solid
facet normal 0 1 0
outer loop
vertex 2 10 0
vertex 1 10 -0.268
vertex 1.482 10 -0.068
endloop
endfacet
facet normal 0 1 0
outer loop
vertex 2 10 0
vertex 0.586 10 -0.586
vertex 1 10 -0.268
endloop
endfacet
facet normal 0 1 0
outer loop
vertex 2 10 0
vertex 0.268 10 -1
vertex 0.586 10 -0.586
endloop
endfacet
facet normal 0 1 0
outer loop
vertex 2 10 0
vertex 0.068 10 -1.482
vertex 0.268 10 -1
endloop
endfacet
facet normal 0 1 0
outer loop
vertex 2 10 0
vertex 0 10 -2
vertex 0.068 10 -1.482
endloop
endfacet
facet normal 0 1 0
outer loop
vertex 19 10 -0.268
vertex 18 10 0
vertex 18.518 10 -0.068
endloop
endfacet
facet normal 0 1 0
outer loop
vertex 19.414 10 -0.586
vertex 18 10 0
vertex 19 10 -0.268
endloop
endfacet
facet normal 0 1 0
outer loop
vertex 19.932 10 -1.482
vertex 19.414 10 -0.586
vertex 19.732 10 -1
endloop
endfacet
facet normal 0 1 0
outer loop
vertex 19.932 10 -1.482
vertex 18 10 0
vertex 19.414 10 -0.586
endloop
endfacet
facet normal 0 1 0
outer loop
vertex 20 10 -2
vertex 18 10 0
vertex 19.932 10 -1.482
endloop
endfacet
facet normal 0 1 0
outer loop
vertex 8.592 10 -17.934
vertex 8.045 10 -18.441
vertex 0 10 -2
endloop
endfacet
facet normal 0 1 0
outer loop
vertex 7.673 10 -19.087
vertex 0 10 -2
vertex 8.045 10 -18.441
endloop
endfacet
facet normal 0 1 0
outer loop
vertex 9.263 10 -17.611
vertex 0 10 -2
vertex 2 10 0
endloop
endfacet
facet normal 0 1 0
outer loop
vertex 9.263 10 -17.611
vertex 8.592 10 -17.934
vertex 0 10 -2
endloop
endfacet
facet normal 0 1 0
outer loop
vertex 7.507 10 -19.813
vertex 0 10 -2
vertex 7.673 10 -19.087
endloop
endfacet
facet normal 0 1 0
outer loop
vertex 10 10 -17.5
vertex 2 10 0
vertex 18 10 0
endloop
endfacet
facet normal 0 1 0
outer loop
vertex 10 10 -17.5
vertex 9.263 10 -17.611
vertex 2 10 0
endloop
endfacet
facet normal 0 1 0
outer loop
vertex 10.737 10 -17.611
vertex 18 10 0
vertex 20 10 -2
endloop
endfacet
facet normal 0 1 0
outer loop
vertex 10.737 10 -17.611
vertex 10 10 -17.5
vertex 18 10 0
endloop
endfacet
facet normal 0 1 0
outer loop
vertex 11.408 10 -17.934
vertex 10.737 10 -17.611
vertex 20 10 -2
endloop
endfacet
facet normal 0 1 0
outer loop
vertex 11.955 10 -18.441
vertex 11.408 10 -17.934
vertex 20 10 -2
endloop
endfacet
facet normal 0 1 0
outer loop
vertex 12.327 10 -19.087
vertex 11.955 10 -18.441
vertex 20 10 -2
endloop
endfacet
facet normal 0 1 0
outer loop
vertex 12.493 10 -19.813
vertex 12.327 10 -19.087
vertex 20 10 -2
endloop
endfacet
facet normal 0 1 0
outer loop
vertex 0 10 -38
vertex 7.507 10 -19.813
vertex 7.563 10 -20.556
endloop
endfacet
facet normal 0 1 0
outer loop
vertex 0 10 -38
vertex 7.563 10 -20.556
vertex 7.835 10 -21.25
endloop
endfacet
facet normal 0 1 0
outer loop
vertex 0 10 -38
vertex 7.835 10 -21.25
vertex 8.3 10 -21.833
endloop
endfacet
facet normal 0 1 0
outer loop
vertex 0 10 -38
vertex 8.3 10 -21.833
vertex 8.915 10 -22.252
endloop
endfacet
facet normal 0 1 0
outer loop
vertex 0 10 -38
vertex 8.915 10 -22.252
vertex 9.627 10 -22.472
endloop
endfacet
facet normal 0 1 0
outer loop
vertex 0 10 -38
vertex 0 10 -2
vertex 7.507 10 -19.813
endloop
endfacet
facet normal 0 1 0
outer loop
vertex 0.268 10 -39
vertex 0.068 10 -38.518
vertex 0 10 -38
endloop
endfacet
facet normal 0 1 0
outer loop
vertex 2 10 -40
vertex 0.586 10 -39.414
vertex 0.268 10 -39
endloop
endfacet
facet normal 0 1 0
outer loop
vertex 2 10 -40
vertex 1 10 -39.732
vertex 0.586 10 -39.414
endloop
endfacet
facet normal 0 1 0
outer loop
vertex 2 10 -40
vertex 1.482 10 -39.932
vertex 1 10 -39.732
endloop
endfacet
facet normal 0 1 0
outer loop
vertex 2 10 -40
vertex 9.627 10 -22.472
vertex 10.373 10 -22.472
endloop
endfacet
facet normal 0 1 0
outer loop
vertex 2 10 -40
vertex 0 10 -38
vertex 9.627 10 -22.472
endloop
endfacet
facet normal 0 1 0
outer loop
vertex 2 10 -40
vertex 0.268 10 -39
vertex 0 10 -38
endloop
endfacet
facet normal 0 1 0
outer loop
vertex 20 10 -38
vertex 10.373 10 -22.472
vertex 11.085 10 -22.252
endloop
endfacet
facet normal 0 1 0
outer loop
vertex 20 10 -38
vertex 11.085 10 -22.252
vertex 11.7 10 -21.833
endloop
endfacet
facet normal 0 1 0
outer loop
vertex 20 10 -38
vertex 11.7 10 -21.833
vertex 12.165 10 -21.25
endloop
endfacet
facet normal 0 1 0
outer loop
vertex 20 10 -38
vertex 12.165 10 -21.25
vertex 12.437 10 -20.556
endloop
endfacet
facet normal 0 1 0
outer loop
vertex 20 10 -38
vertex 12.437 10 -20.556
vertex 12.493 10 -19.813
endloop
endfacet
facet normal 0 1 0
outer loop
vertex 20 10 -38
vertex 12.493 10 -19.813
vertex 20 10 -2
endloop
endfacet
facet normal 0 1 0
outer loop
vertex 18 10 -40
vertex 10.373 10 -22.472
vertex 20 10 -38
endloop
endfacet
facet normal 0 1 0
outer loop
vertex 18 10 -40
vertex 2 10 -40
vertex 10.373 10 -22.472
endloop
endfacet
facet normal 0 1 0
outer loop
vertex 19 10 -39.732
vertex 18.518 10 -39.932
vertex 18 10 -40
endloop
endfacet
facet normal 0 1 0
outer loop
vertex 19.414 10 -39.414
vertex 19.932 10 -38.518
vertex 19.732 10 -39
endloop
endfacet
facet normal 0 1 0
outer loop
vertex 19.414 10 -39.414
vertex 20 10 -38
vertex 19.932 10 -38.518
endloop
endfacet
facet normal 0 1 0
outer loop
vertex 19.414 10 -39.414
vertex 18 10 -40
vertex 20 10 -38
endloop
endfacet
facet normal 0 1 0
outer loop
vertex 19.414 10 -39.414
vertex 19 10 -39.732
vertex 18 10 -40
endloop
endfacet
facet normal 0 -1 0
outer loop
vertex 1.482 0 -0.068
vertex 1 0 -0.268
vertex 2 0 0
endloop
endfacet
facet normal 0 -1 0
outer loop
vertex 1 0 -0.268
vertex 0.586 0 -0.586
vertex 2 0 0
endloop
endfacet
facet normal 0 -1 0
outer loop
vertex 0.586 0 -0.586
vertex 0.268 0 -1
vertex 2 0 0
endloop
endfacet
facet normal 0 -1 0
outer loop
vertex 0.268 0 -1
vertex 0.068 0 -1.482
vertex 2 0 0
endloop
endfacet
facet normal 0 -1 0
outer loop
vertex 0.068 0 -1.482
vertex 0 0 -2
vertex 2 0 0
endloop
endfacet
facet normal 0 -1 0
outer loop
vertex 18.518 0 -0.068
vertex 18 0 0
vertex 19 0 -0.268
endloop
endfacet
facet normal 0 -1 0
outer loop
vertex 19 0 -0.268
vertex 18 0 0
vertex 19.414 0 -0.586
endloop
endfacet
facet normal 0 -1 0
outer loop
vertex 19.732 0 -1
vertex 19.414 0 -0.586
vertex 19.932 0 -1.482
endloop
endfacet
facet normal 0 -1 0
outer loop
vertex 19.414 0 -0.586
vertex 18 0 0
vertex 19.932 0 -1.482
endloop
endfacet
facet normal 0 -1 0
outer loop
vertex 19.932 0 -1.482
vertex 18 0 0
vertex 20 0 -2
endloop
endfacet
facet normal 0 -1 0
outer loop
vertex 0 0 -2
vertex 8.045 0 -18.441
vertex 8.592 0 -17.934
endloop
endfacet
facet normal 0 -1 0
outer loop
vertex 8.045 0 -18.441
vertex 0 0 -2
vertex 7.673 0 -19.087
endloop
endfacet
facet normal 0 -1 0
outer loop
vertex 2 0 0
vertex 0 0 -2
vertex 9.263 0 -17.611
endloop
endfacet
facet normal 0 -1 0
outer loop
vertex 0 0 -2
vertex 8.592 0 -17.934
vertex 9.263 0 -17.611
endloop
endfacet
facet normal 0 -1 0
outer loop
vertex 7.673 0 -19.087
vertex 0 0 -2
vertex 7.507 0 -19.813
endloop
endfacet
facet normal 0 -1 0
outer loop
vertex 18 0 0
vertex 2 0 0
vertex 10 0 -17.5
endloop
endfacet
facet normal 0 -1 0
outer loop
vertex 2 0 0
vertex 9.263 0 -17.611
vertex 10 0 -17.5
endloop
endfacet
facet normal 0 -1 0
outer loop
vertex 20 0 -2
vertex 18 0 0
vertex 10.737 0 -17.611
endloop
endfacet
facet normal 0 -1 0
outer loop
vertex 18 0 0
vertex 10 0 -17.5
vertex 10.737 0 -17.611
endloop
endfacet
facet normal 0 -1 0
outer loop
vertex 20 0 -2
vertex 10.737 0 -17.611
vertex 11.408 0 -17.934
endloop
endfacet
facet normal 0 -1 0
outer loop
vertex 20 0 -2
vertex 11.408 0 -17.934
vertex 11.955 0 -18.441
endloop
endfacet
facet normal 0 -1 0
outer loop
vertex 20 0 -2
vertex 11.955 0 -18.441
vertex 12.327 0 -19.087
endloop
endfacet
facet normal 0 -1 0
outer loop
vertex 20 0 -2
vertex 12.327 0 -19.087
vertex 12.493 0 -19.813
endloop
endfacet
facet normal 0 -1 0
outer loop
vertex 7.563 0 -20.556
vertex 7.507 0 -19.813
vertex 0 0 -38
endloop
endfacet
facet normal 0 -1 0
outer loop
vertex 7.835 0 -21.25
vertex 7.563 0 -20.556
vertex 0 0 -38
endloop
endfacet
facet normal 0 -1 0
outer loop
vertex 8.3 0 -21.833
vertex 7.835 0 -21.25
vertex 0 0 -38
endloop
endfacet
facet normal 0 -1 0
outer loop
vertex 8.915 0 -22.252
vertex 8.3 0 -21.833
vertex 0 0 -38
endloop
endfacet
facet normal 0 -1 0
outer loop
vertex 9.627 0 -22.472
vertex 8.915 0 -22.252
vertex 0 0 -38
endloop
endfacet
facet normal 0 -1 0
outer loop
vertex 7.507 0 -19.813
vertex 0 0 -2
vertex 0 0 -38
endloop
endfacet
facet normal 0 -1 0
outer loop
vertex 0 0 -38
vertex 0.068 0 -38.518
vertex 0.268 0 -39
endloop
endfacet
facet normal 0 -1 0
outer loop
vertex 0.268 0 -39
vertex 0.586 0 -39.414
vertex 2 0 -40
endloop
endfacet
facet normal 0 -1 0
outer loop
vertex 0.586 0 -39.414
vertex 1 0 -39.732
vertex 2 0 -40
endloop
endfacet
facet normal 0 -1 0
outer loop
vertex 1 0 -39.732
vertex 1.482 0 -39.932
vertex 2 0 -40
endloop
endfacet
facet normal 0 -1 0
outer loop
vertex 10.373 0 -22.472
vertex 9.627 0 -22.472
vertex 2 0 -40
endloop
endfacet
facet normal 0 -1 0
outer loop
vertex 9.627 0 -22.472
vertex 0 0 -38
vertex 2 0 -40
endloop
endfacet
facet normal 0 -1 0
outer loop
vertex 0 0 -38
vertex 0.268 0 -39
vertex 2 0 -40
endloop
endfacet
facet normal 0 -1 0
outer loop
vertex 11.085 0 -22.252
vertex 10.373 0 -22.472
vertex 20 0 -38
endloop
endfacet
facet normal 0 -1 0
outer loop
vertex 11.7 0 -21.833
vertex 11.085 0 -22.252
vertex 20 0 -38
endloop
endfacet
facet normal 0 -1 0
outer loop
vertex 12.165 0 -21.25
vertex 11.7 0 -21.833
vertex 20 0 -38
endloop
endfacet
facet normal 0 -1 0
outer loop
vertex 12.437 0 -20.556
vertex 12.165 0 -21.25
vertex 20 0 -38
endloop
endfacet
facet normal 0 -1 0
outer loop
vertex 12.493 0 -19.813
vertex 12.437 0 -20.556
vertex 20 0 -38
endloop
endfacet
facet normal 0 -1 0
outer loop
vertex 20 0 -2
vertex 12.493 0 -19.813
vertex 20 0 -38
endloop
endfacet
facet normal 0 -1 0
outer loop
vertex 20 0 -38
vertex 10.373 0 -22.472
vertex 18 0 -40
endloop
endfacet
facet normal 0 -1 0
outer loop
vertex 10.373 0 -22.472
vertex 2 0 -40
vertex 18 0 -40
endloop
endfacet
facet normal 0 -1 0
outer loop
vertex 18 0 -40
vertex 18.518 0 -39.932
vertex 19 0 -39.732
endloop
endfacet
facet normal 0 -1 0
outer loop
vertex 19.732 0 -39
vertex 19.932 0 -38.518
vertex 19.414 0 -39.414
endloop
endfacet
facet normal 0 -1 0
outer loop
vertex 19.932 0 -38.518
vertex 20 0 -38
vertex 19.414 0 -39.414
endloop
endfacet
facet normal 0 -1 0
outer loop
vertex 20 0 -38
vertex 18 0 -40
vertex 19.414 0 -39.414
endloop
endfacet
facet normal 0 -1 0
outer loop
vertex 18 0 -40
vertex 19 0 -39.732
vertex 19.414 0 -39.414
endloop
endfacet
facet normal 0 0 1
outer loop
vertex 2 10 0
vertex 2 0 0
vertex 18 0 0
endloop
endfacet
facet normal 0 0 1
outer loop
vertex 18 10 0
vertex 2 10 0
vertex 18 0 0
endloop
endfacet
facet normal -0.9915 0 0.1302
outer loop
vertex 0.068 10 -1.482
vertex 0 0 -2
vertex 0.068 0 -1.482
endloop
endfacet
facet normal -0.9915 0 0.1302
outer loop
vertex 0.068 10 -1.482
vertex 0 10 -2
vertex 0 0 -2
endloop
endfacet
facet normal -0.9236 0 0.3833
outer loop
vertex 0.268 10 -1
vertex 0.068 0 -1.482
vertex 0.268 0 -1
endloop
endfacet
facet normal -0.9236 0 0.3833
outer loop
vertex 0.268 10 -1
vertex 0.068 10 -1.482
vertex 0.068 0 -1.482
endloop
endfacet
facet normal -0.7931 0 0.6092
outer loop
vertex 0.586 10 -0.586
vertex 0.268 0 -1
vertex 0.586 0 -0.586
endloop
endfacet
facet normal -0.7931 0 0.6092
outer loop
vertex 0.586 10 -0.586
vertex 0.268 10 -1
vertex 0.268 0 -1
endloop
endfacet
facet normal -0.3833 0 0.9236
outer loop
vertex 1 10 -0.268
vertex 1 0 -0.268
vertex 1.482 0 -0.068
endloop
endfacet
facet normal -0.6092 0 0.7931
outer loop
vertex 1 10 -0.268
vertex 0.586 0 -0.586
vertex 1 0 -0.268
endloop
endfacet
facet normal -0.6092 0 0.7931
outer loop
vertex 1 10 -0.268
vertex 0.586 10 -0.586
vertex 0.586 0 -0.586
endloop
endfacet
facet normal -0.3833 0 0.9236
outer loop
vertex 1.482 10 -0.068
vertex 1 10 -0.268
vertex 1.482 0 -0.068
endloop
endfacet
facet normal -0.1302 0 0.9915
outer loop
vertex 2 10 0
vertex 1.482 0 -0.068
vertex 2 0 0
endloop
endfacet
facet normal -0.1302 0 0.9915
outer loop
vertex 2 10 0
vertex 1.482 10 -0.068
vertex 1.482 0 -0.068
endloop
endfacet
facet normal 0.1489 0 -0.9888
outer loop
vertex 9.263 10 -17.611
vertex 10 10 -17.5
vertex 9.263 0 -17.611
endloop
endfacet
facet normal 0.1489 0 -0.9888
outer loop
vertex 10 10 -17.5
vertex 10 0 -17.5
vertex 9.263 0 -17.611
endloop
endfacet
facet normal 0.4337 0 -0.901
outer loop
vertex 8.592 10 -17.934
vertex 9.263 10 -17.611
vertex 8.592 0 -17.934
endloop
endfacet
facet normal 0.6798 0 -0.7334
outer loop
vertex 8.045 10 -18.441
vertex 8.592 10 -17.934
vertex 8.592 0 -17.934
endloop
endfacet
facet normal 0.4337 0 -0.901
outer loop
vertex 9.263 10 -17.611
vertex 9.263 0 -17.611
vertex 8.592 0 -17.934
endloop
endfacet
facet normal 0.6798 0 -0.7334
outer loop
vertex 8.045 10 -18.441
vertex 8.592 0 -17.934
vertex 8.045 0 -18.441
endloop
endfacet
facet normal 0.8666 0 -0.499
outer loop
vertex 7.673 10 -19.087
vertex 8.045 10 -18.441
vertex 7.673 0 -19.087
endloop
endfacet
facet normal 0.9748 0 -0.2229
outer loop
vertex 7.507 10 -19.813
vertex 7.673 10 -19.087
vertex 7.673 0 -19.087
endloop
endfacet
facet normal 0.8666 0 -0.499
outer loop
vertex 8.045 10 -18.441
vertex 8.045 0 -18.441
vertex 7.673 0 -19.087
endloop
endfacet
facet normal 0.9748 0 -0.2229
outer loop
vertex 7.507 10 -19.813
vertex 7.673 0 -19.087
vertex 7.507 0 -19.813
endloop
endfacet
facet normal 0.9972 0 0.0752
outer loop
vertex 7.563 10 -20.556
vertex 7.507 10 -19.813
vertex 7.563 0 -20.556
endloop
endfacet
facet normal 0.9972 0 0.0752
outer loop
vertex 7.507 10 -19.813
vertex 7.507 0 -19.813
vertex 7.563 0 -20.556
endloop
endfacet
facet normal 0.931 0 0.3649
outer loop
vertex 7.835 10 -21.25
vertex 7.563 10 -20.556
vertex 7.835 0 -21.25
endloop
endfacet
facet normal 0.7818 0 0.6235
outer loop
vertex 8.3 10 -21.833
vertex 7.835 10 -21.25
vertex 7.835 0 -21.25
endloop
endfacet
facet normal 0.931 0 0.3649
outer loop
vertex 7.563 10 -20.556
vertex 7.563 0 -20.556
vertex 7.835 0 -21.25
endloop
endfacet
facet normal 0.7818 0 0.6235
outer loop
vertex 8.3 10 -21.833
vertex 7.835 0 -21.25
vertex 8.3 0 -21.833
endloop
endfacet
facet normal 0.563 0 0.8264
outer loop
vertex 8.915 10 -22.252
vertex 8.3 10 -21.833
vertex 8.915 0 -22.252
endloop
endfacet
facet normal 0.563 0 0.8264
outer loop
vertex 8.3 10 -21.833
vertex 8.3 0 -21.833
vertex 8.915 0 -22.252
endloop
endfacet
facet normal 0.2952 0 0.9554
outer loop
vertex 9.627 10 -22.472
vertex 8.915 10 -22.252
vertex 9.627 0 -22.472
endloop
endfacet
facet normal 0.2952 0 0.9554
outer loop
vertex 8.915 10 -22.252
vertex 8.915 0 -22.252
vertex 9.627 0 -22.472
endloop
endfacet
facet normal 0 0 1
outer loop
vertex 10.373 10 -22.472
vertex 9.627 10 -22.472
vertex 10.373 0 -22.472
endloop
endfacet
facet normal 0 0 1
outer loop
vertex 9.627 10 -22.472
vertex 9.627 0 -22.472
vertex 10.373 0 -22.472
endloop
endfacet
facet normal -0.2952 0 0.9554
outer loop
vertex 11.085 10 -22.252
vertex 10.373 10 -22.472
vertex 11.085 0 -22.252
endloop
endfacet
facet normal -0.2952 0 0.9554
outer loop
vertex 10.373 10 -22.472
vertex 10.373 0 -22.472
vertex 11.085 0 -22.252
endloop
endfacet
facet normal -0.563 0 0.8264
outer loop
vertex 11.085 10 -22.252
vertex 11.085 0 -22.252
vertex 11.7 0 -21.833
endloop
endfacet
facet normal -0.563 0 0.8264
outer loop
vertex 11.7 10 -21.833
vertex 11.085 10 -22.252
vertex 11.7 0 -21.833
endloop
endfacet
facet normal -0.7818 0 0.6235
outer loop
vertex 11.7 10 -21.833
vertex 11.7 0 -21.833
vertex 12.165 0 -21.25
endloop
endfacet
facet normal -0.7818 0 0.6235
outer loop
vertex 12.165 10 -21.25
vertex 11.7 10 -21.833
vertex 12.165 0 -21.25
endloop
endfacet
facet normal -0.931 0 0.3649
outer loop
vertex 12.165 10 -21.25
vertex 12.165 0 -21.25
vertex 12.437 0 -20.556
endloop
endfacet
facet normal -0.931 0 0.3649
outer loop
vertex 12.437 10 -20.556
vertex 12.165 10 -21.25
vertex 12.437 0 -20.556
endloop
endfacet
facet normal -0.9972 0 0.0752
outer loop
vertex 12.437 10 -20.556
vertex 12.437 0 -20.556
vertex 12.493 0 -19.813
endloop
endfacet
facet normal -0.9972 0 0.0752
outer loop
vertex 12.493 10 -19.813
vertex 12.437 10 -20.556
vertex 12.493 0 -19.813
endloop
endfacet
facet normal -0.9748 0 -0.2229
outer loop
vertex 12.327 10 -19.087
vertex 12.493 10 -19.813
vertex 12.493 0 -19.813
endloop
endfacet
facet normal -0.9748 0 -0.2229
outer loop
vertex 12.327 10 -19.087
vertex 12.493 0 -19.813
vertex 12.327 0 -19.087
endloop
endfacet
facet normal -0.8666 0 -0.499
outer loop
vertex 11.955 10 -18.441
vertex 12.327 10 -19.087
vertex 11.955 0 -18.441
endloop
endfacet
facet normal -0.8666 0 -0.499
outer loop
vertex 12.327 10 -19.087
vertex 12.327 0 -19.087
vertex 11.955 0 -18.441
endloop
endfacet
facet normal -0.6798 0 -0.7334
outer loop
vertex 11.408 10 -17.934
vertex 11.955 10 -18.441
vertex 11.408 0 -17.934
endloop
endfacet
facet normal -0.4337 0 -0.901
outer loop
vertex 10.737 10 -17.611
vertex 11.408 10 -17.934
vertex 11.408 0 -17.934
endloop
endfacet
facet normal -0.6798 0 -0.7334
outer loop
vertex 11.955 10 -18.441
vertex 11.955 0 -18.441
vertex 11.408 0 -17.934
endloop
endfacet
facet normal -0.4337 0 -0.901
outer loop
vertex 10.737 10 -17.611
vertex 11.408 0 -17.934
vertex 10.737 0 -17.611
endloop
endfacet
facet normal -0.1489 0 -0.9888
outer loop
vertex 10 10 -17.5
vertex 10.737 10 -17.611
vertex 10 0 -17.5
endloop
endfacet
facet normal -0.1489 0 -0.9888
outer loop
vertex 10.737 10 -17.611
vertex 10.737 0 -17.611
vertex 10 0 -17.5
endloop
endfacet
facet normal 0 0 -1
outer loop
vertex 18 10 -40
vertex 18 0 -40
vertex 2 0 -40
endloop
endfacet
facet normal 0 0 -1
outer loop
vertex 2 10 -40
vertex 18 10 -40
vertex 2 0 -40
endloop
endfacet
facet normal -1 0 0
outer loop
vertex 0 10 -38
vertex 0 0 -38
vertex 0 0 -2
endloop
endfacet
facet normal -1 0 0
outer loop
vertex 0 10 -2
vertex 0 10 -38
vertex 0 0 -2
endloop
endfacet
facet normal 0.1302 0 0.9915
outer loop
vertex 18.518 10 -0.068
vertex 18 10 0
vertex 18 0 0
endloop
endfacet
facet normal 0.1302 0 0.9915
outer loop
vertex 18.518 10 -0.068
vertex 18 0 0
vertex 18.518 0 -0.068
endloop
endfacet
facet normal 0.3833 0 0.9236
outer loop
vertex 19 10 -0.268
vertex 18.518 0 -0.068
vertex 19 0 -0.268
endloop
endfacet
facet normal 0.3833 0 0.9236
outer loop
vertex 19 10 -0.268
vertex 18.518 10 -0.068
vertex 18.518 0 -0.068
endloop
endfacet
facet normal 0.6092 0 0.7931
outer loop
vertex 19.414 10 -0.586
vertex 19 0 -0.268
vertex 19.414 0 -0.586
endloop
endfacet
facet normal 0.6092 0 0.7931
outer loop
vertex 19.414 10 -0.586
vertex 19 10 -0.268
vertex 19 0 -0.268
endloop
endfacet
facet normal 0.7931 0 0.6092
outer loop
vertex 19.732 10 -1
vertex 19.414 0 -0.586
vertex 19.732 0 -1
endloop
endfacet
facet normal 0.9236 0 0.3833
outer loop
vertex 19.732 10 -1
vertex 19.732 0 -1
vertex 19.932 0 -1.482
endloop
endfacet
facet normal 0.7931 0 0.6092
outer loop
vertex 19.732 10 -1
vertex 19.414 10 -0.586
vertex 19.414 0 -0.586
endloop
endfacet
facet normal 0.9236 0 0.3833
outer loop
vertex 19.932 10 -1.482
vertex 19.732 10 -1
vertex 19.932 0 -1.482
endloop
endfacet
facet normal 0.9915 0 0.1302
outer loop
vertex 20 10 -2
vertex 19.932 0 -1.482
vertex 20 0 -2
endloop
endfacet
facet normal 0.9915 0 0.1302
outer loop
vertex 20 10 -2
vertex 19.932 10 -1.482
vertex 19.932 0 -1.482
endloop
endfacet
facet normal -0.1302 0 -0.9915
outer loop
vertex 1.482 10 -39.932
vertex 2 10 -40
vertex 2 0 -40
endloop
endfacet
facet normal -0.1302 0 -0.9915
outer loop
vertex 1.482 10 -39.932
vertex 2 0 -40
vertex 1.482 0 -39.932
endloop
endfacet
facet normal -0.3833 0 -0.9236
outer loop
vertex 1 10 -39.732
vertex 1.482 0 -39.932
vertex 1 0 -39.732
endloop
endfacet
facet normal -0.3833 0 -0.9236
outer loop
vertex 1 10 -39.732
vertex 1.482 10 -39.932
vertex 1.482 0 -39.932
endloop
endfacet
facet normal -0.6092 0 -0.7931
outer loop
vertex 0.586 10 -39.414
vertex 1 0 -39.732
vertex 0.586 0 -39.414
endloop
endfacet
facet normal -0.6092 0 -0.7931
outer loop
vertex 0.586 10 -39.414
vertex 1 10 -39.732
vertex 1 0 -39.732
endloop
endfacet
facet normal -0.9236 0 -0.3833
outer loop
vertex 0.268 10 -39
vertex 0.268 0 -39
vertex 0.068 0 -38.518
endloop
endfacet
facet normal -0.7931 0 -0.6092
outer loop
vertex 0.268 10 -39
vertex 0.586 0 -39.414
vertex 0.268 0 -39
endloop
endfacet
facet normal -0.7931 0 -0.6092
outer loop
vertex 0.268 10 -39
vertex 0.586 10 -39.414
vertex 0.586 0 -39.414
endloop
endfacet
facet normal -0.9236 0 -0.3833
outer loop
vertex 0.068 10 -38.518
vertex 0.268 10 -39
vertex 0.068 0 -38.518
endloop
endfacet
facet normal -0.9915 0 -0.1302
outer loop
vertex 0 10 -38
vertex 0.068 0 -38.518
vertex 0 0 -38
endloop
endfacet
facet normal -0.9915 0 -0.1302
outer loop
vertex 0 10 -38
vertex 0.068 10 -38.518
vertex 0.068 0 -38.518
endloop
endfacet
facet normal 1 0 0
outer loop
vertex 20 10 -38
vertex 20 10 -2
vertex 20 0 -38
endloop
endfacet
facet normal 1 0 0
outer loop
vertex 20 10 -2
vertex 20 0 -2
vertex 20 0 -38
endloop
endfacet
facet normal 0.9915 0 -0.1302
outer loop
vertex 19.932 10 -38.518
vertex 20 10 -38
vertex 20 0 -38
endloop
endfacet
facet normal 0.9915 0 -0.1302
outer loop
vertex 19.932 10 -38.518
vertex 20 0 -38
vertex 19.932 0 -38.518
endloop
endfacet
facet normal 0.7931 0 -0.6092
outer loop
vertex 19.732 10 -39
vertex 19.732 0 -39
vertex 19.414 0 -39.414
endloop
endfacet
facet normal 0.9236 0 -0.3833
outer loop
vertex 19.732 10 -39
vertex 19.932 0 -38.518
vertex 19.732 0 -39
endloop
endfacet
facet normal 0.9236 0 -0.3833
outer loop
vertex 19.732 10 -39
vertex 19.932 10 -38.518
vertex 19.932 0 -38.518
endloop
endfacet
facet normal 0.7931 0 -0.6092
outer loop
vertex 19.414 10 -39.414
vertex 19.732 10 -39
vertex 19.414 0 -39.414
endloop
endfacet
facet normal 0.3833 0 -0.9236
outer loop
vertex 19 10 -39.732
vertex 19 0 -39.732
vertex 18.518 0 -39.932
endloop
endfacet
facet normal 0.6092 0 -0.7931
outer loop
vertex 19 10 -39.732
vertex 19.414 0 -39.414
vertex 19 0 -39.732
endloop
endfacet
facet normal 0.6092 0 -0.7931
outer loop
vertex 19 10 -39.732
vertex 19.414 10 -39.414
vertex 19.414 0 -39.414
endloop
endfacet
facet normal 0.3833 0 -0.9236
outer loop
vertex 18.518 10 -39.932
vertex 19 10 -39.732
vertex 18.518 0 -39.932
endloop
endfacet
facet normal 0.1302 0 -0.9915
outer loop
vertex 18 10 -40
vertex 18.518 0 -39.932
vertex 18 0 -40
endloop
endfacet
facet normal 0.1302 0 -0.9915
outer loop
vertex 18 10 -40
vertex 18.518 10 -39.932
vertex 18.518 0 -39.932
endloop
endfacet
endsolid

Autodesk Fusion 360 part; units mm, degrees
sketch "Sketch1" plane through (0, 0, 0) normal (0, 0, 1) x (1, 0, 0)
  line L0 (0, 0) -> (40, 0)
  line L1 (40, 0) -> (40, -20)
  line L2 (40, -20) -> (0, -20)
  line L3 (0, -20) -> (0, 0)
sketch "Sketch2" plane through (0, 0, 0) normal (0, 1, 0) x (1, 0, 0)
  line L0 (0, 0) -> (20, 0)
  line L1 (20, 0) -> (20, 40)
  line L2 (20, 40) -> (0, 40)
  line L3 (0, 40) -> (0, 0)
extrude "Extrude2" add sketch "Sketch2" along normal blind 10
hole "Hole1" at (10, 10, -20) direction (0, -1, 0) diameter 5 depth 10 tip angle 118
fillet "Fillet1" radius 2 1 edges at (20, 5, 0)
fillet "Fillet2" radius 2 1 edges at (0, 5, 0)
fillet "Fillet3" radius 2 1 edges at (0, 5, -40)
fillet "Fillet4" radius 2 1 edges at (20, 5, -40)
